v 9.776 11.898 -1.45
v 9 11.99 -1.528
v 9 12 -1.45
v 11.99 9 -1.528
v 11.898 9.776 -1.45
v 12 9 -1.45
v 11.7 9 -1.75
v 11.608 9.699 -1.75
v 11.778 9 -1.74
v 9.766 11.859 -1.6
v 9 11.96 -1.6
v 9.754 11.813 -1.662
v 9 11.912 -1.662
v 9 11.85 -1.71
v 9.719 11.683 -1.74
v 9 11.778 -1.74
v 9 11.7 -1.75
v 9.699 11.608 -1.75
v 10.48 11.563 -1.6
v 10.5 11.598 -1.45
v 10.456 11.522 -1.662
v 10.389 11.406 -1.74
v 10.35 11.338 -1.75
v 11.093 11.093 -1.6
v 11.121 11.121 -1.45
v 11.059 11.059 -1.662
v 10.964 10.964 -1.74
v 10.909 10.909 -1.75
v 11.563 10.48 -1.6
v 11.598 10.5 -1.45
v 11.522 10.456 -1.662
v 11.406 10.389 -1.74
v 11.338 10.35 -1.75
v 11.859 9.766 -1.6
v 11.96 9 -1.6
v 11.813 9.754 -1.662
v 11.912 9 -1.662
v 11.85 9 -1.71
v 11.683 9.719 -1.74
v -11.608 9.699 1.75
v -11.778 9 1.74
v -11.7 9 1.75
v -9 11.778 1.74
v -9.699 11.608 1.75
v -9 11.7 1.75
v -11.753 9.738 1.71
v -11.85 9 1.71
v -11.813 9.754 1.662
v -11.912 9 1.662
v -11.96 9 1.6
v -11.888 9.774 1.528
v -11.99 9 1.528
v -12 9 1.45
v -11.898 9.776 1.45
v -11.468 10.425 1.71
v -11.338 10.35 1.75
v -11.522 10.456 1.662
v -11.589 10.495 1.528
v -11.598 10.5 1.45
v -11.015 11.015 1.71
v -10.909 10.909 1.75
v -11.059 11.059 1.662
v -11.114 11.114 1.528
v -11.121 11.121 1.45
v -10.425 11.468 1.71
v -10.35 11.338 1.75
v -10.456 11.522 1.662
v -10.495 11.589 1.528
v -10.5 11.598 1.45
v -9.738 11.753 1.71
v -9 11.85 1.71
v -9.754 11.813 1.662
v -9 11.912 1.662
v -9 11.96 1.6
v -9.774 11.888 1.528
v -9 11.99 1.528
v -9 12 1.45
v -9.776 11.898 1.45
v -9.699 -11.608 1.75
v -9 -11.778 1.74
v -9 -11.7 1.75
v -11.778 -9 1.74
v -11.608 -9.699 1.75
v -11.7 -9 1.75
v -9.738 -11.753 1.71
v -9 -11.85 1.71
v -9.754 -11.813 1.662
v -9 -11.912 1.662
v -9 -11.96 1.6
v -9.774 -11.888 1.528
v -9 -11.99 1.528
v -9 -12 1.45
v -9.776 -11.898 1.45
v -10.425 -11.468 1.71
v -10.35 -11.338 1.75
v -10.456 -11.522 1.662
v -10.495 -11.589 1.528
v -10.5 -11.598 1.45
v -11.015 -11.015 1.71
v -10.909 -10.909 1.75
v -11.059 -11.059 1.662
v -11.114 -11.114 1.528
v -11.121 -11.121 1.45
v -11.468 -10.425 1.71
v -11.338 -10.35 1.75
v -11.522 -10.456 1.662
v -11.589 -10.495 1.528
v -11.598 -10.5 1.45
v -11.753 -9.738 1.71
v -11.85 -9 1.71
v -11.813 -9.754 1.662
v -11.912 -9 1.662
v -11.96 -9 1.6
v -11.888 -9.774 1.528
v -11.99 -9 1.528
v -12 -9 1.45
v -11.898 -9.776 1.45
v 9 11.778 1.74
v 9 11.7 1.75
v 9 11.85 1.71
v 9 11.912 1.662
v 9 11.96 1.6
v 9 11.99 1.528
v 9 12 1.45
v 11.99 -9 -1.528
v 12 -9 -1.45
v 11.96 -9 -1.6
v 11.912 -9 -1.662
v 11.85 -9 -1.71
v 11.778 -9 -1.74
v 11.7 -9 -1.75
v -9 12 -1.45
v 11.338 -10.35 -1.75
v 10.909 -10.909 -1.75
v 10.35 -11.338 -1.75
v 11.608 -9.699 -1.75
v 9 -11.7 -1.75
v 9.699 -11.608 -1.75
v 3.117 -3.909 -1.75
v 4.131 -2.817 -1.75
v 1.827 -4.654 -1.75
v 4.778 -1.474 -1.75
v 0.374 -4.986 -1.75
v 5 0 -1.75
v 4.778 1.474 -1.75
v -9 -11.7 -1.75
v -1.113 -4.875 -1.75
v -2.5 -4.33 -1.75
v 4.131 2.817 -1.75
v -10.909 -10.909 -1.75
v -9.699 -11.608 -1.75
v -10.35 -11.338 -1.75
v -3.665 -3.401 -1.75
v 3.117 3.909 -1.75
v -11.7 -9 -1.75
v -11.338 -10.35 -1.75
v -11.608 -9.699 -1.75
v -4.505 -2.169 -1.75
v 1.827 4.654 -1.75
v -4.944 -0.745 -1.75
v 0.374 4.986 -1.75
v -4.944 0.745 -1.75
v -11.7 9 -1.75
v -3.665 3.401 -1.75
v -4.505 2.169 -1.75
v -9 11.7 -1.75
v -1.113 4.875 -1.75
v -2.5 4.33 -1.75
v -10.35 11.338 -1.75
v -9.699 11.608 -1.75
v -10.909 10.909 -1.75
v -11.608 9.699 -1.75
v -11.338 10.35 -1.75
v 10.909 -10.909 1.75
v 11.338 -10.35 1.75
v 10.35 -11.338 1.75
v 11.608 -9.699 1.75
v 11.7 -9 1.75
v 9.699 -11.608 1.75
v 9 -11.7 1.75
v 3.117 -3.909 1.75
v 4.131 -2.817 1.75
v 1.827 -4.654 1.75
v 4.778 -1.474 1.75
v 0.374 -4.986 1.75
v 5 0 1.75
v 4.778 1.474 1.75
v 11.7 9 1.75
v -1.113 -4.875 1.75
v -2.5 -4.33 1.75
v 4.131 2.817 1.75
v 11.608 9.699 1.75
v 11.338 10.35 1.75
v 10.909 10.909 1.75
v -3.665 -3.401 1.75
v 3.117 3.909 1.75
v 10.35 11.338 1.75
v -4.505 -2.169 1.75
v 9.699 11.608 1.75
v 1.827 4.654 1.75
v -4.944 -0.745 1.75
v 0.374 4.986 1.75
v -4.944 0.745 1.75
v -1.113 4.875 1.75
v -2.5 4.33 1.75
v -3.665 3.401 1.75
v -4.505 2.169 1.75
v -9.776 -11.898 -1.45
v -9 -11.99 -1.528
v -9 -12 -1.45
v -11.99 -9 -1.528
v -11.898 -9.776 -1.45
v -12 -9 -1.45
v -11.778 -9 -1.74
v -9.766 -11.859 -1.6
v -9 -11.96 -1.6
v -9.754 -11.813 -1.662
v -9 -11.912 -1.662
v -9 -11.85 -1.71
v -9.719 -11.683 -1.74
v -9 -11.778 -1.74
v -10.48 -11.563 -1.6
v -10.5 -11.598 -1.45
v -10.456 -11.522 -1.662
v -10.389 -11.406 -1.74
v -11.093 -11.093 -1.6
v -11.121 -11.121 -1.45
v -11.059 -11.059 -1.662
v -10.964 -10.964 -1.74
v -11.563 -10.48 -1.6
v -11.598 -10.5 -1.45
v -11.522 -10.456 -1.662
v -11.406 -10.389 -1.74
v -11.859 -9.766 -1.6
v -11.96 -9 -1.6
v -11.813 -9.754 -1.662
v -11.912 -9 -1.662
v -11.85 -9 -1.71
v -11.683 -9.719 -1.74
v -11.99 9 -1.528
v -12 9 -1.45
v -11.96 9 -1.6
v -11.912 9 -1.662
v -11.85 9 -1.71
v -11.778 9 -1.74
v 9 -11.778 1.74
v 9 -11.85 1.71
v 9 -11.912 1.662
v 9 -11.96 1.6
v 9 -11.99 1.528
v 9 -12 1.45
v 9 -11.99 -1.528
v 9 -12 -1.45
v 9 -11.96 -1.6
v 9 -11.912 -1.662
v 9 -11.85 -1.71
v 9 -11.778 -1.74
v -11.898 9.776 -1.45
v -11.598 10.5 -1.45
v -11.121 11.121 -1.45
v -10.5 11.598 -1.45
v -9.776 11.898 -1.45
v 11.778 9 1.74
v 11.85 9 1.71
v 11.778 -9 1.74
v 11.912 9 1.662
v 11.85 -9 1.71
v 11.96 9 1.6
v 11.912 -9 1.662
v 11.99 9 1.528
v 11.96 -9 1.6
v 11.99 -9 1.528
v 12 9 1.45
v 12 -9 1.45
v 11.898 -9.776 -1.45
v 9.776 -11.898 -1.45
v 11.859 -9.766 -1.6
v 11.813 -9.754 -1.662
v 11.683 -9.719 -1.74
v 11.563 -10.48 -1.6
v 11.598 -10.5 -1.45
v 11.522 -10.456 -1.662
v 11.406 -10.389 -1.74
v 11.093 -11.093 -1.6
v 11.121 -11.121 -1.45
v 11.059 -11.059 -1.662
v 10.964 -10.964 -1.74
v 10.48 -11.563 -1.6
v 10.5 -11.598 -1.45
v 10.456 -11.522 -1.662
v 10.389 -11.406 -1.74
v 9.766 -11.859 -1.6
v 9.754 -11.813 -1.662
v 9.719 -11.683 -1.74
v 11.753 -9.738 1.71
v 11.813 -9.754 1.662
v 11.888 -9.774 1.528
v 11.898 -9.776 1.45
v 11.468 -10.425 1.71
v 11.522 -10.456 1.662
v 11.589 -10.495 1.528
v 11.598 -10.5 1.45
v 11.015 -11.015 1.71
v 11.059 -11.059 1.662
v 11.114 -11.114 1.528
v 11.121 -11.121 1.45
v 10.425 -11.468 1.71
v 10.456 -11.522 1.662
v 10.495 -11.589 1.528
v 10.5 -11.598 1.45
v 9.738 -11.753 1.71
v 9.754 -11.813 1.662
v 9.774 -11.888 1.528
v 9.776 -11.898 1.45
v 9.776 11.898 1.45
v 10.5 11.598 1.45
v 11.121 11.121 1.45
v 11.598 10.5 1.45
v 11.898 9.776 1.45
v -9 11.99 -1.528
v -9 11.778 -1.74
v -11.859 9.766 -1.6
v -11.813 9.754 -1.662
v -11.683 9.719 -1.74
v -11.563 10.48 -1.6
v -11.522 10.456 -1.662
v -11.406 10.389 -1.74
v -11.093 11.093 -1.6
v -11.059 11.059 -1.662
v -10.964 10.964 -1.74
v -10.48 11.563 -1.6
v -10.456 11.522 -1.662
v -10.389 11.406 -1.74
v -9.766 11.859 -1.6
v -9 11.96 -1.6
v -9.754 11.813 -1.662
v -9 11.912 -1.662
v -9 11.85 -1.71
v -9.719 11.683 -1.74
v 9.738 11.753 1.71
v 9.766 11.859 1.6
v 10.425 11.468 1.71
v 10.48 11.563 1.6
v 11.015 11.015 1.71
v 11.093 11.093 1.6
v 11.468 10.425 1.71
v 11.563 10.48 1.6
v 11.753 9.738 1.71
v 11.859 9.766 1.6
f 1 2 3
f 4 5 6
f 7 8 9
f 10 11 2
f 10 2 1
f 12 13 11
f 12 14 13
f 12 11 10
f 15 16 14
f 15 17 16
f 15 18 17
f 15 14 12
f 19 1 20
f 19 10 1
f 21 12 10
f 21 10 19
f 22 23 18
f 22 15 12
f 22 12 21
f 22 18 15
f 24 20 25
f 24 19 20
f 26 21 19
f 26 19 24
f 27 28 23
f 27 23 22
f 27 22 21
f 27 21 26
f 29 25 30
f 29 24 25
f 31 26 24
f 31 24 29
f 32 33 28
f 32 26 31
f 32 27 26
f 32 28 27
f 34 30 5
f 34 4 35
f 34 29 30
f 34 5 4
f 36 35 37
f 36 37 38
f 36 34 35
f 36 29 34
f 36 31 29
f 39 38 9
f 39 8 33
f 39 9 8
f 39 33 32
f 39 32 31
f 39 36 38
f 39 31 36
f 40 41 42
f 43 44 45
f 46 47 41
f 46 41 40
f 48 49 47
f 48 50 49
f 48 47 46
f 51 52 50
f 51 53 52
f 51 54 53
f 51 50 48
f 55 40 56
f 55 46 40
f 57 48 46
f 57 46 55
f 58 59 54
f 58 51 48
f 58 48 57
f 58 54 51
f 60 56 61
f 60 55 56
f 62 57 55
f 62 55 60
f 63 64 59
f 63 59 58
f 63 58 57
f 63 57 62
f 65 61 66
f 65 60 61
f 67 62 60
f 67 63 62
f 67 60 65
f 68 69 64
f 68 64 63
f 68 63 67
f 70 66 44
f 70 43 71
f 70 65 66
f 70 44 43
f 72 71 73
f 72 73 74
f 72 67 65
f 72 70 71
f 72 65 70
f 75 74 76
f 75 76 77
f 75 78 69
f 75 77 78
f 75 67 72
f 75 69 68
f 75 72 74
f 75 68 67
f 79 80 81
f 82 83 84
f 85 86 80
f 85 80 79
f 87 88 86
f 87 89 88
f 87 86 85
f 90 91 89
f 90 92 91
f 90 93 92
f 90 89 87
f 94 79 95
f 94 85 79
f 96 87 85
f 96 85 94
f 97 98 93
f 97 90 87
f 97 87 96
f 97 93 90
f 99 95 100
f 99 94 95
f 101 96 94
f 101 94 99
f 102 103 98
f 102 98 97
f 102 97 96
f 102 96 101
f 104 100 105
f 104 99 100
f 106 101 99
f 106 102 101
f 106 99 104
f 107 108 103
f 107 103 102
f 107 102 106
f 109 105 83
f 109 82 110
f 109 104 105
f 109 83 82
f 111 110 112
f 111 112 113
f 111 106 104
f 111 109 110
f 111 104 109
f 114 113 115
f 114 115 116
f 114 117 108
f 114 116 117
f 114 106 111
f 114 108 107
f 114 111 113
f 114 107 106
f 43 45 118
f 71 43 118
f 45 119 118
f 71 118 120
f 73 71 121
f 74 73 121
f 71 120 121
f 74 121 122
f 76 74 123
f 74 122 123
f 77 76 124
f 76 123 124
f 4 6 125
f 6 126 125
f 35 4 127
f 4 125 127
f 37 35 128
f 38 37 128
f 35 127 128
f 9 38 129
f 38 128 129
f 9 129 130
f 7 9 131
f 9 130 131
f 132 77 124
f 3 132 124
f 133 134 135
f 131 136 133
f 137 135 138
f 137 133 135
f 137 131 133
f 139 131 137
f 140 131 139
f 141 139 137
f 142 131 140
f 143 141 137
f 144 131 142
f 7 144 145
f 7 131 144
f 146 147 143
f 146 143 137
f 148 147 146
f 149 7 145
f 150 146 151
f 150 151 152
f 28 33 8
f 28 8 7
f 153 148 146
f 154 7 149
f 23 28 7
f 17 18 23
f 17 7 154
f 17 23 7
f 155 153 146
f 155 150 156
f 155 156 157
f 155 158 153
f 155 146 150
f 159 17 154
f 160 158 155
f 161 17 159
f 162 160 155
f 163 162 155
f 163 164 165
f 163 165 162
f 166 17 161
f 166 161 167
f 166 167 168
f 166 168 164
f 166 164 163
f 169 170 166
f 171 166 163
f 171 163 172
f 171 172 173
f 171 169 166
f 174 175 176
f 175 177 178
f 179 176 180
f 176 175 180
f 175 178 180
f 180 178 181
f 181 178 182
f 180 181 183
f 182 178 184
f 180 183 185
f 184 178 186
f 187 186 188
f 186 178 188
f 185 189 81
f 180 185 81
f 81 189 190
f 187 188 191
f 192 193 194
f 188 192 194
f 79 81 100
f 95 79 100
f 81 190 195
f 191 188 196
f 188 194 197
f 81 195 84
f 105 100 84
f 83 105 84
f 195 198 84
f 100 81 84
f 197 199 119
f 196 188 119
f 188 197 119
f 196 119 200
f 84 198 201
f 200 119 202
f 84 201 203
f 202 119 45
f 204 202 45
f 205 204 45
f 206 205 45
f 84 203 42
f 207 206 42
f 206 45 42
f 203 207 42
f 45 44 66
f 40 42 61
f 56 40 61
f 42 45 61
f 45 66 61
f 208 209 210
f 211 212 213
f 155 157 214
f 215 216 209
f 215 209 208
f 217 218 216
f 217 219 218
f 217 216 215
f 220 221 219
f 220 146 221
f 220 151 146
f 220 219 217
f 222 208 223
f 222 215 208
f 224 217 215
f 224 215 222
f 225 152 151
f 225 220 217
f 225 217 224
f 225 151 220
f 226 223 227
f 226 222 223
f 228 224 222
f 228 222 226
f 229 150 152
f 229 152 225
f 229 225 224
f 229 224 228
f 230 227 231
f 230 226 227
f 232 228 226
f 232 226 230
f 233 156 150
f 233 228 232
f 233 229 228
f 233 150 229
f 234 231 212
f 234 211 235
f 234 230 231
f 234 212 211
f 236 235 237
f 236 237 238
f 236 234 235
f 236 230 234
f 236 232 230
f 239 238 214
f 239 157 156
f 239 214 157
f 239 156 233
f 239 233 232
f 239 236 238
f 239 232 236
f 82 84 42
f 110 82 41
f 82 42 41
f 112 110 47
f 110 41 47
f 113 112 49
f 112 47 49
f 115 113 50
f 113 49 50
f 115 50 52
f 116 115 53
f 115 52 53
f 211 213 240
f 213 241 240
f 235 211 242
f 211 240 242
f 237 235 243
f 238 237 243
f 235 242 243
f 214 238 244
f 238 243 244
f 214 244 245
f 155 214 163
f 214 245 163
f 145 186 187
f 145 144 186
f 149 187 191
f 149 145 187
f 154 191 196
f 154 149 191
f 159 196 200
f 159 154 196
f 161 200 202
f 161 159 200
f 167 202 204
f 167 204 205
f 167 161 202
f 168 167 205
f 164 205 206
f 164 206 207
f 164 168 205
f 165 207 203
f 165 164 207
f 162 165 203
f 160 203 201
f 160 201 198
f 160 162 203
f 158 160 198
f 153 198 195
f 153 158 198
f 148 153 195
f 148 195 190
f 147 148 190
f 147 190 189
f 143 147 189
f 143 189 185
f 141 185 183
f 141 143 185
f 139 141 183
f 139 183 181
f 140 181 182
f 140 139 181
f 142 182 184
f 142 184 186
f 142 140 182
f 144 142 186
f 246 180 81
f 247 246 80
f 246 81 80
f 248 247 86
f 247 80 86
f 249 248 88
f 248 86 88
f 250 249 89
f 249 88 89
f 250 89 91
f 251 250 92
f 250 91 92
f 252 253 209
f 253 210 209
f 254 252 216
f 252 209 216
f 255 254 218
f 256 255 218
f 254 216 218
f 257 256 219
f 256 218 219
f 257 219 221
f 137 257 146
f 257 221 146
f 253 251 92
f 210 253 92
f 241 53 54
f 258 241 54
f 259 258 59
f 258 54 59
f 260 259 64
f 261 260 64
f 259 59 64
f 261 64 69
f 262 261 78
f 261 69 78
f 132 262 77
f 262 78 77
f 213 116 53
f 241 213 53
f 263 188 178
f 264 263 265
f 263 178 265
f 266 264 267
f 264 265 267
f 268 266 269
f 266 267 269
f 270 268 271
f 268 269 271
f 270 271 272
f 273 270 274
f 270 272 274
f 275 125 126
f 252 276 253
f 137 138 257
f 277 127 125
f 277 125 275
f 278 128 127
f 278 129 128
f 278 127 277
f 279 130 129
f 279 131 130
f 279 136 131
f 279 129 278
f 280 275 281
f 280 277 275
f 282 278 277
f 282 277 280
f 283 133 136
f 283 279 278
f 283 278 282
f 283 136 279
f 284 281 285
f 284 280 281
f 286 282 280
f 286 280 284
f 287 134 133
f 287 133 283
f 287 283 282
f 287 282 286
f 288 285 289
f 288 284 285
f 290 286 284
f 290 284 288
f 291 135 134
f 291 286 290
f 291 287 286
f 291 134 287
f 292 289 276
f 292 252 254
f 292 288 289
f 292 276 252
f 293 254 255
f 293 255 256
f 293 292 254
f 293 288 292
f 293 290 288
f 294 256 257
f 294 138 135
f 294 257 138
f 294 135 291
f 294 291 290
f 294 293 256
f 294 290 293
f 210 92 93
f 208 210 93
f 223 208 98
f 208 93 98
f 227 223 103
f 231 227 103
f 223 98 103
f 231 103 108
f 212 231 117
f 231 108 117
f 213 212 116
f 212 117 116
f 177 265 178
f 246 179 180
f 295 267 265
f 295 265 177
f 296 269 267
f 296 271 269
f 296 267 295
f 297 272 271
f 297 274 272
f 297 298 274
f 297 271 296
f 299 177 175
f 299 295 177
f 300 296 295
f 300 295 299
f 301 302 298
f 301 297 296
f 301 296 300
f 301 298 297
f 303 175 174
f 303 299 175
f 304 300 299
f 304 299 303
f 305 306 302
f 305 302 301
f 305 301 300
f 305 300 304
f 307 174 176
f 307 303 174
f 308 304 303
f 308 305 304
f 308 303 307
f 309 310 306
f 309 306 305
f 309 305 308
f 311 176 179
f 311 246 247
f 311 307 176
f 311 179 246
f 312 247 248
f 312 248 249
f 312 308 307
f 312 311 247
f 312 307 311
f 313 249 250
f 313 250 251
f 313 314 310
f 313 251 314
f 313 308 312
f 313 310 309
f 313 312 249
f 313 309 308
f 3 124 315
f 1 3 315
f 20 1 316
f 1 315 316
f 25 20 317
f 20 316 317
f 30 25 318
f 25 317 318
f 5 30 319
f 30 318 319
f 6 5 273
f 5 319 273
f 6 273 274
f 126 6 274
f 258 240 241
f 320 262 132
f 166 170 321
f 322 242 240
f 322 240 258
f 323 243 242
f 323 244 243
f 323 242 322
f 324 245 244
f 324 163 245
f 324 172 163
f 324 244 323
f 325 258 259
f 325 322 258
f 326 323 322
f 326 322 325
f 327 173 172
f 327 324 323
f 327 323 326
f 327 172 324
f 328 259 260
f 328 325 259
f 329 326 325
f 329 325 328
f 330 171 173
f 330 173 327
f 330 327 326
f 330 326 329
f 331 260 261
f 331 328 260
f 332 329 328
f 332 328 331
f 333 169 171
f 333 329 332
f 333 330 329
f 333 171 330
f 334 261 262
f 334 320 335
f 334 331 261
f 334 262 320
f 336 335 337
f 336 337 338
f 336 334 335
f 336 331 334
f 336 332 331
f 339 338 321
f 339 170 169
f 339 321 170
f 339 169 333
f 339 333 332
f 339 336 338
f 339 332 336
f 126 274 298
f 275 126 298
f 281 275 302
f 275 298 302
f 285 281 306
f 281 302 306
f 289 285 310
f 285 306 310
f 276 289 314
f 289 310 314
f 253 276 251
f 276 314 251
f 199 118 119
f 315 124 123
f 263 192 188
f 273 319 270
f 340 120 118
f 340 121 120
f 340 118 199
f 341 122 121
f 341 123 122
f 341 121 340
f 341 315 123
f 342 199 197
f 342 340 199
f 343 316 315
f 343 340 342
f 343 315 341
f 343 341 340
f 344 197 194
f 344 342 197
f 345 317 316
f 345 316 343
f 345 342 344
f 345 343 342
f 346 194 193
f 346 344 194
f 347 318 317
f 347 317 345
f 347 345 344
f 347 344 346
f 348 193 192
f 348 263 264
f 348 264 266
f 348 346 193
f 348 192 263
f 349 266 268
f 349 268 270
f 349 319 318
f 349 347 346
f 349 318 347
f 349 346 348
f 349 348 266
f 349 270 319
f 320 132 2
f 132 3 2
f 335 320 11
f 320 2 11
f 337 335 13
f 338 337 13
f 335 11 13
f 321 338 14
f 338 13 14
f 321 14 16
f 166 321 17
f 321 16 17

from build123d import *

# Parameters (mm, degrees)
SKETCH1_R           = 5
BOSS_EXTRUDE1_DEPTH = 1.75
FILLET1_R           = 0.3


with BuildPart() as part:
    # Sketch1 → Boss-Extrude1 (new, symmetric)
    with BuildSketch(Plane.XY):
        with BuildLine():
            Line((9, -12), (-9, -12))
            ThreePointArc((-9, -12), (-11.121320344, -11.121320344), (-12, -9))
            Line((-12, -9), (-12, 9))
            ThreePointArc((-12, 9), (-11.121320344, 11.121320344), (-9, 12))
            Line((-9, 12), (9, 12))
            ThreePointArc((9, 12), (11.121320344, 11.121320344), (12, 9))
            Line((12, 9), (12, -9))
            ThreePointArc((12, -9), (11.121320344, -11.121320344), (9, -12))
        make_face()
        Circle(SKETCH1_R, mode=Mode.SUBTRACT)
    extrude(amount=BOSS_EXTRUDE1_DEPTH, both=True)

    # Fillet1
    fillet1_edges = [part.edges().sort_by_distance(p)[0] for p in [
        (0, 12, -1.75),
        (11.121320344, 11.121320344, -1.75),
        (12, 0, -1.75),
        (11.121320344, -11.121320344, -1.75),
        (11.121320344, 11.121320344, 1.75),
        (0, 12, 1.75),
        (-11.121320344, 11.121320344, 1.75),
        (-12, 0, 1.75),
        (-11.121320344, -11.121320344, 1.75),
        (0, -12, 1.75),
        (11.121320344, -11.121320344, 1.75),
        (0, -12, -1.75),
        (12, 0, 1.75),
        (-11.121320344, -11.121320344, -1.75),
        (-12, 0, -1.75),
        (-11.121320344, 11.121320344, -1.75),
    ]]
    fillet(fillet1_edges, radius=FILLET1_R)


solid = part.part
